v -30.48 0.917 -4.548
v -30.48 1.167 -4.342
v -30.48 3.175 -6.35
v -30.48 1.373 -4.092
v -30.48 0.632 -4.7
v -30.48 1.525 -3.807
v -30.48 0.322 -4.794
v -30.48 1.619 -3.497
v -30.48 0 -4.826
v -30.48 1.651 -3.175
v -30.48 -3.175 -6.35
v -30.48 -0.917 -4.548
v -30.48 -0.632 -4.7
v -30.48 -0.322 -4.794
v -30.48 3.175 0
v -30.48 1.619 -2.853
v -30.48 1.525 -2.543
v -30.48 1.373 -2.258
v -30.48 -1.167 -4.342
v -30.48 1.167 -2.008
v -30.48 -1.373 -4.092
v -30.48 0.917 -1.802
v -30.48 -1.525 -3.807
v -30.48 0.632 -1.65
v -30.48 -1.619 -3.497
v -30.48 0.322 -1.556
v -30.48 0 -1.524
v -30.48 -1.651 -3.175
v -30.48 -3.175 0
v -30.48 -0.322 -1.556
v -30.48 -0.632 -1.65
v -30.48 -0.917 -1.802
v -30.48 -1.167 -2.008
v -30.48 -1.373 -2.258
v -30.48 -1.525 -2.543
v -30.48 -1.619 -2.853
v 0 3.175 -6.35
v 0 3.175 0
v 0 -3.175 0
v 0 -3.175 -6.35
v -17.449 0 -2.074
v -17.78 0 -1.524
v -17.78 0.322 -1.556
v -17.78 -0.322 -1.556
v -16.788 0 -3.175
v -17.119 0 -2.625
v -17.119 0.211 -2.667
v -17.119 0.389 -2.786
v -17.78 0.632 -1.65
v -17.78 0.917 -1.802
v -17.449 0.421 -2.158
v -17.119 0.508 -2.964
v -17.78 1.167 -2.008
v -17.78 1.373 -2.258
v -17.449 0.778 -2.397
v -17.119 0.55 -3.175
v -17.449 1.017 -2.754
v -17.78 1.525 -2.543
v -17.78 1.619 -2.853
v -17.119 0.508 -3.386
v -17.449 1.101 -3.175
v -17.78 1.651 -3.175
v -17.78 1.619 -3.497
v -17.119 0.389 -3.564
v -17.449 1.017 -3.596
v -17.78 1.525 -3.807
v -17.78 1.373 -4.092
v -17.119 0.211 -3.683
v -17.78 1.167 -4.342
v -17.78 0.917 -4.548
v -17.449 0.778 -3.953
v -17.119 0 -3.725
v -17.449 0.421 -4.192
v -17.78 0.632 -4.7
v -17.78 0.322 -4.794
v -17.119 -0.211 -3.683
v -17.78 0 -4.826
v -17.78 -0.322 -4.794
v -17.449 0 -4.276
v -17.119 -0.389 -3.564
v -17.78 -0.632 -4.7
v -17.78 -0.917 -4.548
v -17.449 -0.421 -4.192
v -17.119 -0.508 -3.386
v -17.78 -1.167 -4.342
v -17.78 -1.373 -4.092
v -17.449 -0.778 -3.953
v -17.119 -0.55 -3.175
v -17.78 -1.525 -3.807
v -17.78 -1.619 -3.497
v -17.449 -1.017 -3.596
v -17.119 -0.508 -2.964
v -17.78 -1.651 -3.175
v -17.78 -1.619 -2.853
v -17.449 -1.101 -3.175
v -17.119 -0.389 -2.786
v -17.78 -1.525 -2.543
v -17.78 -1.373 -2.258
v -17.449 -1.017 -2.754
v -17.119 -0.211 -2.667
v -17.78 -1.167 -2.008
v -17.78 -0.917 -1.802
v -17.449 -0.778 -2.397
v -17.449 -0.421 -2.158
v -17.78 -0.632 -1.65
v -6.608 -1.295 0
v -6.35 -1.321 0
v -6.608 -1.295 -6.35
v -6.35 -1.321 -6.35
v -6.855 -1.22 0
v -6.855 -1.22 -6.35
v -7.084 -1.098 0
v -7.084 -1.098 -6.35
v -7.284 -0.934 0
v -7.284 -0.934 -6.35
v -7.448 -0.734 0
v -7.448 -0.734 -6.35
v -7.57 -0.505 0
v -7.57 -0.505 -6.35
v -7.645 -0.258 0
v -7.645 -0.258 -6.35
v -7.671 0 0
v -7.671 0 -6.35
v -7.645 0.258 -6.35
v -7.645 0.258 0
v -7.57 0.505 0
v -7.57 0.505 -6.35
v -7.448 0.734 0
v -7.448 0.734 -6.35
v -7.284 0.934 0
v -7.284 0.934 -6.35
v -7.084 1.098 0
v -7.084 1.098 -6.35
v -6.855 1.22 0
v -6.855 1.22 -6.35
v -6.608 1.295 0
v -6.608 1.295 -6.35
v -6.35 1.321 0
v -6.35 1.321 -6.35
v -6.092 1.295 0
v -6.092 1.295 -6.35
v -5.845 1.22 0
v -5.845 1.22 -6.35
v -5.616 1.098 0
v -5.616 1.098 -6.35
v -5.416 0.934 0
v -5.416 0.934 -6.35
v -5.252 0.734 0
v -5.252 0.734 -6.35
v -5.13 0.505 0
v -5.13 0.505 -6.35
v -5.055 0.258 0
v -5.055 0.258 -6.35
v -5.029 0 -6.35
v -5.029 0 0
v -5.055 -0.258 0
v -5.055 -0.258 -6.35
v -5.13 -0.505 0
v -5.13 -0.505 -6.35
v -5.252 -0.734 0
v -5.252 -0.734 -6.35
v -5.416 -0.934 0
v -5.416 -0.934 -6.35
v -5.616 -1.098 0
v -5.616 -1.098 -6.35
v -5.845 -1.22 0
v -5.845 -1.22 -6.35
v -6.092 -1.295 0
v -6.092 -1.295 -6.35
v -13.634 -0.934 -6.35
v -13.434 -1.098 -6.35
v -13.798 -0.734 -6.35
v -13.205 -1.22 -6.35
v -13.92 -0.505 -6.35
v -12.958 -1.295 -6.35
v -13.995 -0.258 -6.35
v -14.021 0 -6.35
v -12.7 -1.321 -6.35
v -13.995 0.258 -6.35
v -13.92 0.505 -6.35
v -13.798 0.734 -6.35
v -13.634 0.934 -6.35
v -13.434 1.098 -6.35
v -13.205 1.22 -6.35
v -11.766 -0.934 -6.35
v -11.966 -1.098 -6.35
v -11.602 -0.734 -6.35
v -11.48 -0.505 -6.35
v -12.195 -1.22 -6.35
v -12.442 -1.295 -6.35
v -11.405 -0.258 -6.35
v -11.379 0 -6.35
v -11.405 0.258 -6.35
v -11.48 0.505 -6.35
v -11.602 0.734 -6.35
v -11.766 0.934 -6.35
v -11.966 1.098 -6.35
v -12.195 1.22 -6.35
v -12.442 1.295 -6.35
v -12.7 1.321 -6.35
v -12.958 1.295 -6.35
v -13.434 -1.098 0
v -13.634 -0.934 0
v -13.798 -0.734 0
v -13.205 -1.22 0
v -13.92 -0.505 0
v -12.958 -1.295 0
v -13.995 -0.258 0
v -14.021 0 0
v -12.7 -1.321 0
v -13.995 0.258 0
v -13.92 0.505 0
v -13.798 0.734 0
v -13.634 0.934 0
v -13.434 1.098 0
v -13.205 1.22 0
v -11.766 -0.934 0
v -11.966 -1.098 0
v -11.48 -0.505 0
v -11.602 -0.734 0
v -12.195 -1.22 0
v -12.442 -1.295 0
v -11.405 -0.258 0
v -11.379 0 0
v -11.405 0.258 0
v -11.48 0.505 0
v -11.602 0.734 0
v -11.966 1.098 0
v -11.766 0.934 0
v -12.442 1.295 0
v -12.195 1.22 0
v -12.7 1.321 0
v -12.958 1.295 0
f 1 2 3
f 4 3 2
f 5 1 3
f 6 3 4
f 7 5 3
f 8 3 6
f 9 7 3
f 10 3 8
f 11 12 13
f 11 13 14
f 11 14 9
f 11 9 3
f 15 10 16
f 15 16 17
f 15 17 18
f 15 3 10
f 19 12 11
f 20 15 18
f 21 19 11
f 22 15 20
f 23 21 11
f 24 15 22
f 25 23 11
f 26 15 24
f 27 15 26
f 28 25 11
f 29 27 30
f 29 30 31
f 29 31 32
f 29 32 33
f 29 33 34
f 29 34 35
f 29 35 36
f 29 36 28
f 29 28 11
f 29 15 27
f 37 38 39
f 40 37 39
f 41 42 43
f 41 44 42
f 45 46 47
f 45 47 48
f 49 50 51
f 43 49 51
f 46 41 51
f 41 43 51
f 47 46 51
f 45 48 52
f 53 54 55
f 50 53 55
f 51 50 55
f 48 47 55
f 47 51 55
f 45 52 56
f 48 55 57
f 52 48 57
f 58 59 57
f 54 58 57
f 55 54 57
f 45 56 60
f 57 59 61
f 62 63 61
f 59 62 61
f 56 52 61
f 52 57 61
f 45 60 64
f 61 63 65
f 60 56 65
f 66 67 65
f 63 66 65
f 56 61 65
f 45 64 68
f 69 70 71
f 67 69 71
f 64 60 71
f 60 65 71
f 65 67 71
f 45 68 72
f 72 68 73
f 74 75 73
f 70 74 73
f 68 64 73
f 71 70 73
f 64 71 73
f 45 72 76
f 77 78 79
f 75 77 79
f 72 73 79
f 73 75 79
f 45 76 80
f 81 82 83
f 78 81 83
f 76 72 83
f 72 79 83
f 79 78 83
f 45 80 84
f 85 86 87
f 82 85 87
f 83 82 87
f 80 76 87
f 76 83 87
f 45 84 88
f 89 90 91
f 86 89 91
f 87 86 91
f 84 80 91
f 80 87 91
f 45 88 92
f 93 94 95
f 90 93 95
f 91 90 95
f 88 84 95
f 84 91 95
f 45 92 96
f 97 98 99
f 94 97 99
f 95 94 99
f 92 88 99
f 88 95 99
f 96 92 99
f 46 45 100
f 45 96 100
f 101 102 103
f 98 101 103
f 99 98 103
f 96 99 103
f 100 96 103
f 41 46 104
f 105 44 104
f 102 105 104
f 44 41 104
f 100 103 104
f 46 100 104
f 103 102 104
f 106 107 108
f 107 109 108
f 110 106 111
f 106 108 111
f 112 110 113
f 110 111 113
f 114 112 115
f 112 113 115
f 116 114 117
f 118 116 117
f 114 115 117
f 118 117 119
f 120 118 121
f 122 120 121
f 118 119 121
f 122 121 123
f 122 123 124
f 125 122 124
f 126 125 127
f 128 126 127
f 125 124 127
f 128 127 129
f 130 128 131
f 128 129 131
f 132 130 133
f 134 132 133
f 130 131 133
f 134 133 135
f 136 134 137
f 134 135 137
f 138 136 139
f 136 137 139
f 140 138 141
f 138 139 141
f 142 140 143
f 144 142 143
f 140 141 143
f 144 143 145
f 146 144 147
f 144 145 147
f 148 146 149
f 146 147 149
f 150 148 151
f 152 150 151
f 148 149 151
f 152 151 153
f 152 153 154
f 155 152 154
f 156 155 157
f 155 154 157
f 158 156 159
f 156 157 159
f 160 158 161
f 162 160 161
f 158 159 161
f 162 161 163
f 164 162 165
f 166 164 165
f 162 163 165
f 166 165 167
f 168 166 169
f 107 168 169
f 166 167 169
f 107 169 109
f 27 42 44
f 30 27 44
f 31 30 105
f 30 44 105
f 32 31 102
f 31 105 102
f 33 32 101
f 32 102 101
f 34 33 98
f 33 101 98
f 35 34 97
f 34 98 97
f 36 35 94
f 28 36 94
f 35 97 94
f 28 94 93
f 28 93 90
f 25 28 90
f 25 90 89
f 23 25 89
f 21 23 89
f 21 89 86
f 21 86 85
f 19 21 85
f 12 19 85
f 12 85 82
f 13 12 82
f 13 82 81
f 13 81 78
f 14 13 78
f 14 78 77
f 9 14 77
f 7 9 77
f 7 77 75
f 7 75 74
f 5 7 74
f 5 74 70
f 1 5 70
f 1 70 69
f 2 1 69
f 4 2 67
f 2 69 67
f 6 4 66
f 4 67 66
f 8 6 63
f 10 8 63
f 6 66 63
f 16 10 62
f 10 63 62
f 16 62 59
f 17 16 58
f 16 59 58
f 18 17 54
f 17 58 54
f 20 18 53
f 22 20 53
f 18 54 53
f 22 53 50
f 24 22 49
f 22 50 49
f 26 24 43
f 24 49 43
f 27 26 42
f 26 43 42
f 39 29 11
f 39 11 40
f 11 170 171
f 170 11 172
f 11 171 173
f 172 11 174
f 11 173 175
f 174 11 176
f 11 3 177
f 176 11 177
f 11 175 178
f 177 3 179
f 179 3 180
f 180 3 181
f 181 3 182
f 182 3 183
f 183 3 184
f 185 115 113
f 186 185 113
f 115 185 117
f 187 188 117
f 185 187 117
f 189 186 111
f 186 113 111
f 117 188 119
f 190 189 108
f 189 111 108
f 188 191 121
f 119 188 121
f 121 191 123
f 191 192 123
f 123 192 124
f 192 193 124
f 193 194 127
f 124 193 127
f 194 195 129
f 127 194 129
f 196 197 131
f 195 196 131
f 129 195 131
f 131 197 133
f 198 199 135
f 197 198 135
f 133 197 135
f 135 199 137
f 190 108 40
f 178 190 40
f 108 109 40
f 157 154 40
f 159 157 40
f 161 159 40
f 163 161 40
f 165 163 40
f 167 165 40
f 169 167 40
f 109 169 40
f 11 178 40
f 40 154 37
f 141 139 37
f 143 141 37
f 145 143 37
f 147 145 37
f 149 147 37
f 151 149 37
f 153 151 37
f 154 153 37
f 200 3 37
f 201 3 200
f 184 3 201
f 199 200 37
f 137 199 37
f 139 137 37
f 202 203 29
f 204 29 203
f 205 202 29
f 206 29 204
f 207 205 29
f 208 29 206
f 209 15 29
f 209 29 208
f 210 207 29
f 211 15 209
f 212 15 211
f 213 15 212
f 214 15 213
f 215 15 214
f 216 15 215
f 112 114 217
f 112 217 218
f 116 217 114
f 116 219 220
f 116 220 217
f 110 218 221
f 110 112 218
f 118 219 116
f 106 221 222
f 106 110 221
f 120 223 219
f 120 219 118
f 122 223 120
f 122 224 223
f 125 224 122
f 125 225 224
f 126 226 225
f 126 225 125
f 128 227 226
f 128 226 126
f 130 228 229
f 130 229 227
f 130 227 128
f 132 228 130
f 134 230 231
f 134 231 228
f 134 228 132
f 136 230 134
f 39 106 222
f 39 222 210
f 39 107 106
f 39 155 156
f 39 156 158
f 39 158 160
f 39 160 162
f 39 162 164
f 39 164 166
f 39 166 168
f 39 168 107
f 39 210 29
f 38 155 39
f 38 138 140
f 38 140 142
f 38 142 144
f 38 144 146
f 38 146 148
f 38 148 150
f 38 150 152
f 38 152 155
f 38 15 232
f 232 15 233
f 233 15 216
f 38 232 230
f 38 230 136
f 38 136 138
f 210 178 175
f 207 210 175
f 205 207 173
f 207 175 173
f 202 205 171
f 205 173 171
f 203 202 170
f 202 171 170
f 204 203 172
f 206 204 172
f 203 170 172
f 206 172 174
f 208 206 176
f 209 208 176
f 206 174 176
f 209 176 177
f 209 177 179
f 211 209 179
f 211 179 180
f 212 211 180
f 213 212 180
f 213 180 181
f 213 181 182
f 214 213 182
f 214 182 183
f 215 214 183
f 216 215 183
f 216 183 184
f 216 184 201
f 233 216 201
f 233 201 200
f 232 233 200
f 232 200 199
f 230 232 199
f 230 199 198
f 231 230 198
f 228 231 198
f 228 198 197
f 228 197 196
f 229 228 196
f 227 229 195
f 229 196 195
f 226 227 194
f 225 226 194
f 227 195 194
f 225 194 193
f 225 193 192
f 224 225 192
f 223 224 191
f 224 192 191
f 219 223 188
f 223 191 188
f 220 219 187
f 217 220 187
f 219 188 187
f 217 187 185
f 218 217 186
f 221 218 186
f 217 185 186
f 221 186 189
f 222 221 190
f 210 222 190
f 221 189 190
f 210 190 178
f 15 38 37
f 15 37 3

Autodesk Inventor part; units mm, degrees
ref_plane "YZ Plane" through (0, 0, 0) normal (1, 0, 0) x (0, 1, 0)
ref_plane "XZ Plane" through (0, 0, 0) normal (0, 1, 0) x (-1, 0, 0)
ref_plane "XY Plane" through (0, 0, 0) normal (0, 0, 1) x (1, 0, 0)
sketch "Sketch1" plane through (0, 0, 0) normal (0, 0, 1) x (1, 0, 0)
  line L0 (0, 4.445) -> (0, -4.445) projected
  line L1 (-38.1, 0) -> (6.35, 0) projected
  line L2 (-30.48, -3.175) -> (0, -3.175)
  line L3 (0, -3.175) -> (0, 3.175)
  line L4 (0, 3.175) -> (-30.48, 3.175)
  line L5 (-30.48, 3.175) -> (-30.48, -3.175)
  line L6 (-30.48, -3.175) -> (0, 3.175) construction
  line L7 (0, -3.175) -> (-30.48, 3.175) construction
  point P0 (0, 0)
  point P1 (-15.24, 0)
  point P2 (-6.35, 0)
  point P3 (-12.7, 0)
  point P4 (-19.05, 0)
  point P5 (-25.4, 0)
  point P6 (-31.75, 0)
  dimension "d0" = 6.35
  dimension "d1" = 30.48
  dimension "d2" = 6.35
  dimension "d3" = 6.35
  dimension "d4" = 6.35
  dimension "d5" = 6.35
  dimension "d6" = 6.35
extrude "Extrusion1" add sketch "Sketch1" against normal blind 6.35
hole "Hole1" at (-6.35, 0, 0) at (-12.7, 0, 0) direction (0, 0, -1) diameter 2.6416 end through all thread size "6-32 UNC" class "2B" standard "ANSI Unified Screw Threads"
hole "Hole2" [suppressed]
fillet "Fillet1" [suppressed]
sketch "Sketch2" plane through (-30.48, -3.175, 0) normal (-1, 0, 0) x (0, 0, 1)
  line L0 (0, 6.35) -> (0, 0) projected
  line L1 (0, 6.35) -> (-6.35, 6.35) projected
  line L2 (-6.35, 0) -> (-6.35, 6.35) projected
  line L3 (0, 0) -> (-6.35, 0) projected
  line L4 (-6.35, 0) -> (-6.35, 6.35) construction
  line L5 (-6.35, 6.35) -> (0, 0) construction
  point P0 (0, 3.175)
  point P1 (-3.175, 3.175)
hole "Hole3" at (-30.48, 0, -3.175) direction (1, 0, 0) diameter 3.302 depth 12.7 tip angle 118 thread size "8-32 UNC" class "2B" standard "ANSI Unified Screw Threads"
properties part number "J010309" material "ALUMINUM, 6061-T651"
